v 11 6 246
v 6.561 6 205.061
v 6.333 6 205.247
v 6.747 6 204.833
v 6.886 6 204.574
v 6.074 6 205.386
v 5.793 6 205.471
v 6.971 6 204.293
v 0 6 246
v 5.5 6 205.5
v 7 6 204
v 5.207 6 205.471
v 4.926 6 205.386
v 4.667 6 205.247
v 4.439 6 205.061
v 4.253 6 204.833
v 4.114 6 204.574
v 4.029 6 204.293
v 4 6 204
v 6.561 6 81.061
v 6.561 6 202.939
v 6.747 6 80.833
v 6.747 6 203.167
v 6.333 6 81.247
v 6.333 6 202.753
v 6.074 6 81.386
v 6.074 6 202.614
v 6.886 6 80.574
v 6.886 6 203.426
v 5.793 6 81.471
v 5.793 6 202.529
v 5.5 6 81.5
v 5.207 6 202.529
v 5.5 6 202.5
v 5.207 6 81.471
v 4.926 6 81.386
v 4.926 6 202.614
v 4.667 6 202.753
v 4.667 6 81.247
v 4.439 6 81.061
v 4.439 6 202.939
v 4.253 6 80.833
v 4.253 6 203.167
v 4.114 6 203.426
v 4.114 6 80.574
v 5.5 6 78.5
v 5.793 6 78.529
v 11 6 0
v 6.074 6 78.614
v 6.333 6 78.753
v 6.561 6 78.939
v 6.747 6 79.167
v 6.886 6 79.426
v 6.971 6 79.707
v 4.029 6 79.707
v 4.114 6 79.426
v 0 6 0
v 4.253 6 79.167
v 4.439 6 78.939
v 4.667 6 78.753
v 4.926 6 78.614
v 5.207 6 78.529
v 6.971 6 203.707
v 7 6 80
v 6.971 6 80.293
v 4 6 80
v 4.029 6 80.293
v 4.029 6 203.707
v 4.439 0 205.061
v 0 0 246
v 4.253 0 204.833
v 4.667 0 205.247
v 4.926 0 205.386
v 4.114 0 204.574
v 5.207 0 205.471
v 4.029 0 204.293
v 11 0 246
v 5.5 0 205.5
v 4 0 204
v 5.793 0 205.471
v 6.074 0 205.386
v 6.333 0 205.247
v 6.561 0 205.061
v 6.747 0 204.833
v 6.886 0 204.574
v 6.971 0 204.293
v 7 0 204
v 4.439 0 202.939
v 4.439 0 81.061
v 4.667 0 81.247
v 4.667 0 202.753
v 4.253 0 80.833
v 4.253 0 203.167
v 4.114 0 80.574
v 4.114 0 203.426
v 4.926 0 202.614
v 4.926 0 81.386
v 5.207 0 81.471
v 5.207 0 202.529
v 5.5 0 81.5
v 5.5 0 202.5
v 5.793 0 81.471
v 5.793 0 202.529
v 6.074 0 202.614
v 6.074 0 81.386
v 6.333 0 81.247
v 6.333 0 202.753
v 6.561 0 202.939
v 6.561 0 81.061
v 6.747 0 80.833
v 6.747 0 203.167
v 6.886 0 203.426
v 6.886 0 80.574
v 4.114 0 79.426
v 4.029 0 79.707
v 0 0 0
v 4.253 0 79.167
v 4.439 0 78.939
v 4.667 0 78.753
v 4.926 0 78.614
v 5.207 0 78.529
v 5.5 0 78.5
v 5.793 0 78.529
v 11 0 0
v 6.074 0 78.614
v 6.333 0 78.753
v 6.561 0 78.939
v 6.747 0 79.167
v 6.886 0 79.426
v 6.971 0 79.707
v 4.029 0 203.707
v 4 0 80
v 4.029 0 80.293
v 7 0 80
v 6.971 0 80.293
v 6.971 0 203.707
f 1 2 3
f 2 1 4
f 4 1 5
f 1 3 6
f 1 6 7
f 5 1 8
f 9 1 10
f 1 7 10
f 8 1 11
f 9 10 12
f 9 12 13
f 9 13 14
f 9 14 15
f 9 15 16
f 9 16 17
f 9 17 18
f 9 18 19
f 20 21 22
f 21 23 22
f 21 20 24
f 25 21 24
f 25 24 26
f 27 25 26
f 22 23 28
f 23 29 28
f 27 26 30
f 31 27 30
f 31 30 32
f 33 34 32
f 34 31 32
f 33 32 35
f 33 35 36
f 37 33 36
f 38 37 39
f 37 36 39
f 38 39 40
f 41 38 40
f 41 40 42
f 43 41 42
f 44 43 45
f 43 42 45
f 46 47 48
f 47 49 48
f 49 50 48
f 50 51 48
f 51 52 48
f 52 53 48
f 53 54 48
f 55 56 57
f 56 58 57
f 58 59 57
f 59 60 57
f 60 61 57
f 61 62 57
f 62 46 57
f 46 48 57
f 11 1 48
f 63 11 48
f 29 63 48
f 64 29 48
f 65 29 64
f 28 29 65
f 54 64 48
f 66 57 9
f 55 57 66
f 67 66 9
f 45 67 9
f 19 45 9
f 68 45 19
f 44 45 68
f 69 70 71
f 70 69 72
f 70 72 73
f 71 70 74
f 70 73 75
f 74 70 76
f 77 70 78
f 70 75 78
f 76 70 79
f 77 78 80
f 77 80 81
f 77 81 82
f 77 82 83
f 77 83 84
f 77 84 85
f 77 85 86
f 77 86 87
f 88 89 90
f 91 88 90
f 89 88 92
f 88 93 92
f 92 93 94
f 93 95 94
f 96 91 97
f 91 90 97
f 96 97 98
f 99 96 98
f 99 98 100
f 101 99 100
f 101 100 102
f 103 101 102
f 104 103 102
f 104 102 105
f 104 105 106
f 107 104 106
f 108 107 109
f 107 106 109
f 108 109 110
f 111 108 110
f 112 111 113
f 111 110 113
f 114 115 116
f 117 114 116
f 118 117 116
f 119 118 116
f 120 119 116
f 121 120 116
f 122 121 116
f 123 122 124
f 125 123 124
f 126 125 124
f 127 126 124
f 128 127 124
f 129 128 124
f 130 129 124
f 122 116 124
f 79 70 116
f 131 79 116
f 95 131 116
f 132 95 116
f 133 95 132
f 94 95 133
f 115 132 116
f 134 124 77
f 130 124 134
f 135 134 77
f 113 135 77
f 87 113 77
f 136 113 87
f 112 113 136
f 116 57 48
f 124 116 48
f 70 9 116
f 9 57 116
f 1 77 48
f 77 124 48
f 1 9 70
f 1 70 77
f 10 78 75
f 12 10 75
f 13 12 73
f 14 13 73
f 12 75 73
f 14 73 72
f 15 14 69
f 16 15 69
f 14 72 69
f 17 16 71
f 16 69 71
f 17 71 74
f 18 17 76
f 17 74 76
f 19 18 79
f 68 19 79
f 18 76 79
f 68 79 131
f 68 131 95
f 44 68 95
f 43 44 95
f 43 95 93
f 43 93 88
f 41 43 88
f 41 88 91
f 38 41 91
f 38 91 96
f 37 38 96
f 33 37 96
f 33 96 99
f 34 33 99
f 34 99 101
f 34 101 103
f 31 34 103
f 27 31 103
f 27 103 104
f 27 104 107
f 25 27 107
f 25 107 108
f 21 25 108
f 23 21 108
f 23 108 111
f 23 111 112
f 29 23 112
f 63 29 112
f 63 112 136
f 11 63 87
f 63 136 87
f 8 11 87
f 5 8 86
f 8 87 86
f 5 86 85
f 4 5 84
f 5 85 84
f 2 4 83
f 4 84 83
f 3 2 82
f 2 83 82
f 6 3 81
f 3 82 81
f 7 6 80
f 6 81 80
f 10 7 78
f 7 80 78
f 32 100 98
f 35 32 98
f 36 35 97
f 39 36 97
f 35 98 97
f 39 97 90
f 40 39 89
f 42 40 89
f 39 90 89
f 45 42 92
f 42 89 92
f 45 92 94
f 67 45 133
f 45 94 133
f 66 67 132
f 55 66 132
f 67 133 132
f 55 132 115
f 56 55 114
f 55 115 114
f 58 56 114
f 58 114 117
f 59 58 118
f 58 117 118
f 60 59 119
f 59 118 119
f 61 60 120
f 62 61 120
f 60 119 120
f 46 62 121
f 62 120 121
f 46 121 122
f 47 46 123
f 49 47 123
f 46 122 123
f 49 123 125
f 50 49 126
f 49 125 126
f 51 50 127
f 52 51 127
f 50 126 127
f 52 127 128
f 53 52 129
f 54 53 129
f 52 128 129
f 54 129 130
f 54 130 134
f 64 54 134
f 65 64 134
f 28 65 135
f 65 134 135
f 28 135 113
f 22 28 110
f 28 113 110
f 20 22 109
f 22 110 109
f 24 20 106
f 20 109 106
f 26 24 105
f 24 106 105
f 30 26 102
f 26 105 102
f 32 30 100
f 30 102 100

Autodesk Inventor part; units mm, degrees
ref_plane "YZ Plane" through (0, 0, 0) normal (1, 0, 0) x (0, 1, 0)
ref_plane "XZ Plane" through (0, 0, 0) normal (0, 1, 0) x (-1, 0, 0)
ref_plane "XY Plane" through (0, 0, 0) normal (0, 0, 1) x (1, 0, 0)
sketch "スケッチ1" plane through (0, 0, 0) normal (0, 0, 1) x (1, 0, 0)
  line L0 (0, 0) -> (11, 0)
  line L1 (11, 0) -> (11, 6)
  line L2 (11, 6) -> (0, 6)
  line L3 (0, 6) -> (0, 0)
  dimension "d0" = 11
  dimension "d1" = 6
extrude "押し出し1" add sketch "スケッチ1" along normal blind 246
sketch "スケッチ2" plane through (0, 6, 0) normal (0, 1, 0) x (1, 0, 0)
  line L0 (11, 0) -> (0, 0) projected
  line L1 (11, -246) -> (0, -246) projected
  point P0 (5.5, -204)
  point P1 (5.5, -80)
  point P2 (5.5, 0)
  dimension "d4" = 80
  dimension "d5" = 42
hole "穴1" at (5.5, 6, 204) at (5.5, 6, 80) direction (0, -1, 0) diameter 3 depth 8 tip angle 118
properties part number "slider4a"
